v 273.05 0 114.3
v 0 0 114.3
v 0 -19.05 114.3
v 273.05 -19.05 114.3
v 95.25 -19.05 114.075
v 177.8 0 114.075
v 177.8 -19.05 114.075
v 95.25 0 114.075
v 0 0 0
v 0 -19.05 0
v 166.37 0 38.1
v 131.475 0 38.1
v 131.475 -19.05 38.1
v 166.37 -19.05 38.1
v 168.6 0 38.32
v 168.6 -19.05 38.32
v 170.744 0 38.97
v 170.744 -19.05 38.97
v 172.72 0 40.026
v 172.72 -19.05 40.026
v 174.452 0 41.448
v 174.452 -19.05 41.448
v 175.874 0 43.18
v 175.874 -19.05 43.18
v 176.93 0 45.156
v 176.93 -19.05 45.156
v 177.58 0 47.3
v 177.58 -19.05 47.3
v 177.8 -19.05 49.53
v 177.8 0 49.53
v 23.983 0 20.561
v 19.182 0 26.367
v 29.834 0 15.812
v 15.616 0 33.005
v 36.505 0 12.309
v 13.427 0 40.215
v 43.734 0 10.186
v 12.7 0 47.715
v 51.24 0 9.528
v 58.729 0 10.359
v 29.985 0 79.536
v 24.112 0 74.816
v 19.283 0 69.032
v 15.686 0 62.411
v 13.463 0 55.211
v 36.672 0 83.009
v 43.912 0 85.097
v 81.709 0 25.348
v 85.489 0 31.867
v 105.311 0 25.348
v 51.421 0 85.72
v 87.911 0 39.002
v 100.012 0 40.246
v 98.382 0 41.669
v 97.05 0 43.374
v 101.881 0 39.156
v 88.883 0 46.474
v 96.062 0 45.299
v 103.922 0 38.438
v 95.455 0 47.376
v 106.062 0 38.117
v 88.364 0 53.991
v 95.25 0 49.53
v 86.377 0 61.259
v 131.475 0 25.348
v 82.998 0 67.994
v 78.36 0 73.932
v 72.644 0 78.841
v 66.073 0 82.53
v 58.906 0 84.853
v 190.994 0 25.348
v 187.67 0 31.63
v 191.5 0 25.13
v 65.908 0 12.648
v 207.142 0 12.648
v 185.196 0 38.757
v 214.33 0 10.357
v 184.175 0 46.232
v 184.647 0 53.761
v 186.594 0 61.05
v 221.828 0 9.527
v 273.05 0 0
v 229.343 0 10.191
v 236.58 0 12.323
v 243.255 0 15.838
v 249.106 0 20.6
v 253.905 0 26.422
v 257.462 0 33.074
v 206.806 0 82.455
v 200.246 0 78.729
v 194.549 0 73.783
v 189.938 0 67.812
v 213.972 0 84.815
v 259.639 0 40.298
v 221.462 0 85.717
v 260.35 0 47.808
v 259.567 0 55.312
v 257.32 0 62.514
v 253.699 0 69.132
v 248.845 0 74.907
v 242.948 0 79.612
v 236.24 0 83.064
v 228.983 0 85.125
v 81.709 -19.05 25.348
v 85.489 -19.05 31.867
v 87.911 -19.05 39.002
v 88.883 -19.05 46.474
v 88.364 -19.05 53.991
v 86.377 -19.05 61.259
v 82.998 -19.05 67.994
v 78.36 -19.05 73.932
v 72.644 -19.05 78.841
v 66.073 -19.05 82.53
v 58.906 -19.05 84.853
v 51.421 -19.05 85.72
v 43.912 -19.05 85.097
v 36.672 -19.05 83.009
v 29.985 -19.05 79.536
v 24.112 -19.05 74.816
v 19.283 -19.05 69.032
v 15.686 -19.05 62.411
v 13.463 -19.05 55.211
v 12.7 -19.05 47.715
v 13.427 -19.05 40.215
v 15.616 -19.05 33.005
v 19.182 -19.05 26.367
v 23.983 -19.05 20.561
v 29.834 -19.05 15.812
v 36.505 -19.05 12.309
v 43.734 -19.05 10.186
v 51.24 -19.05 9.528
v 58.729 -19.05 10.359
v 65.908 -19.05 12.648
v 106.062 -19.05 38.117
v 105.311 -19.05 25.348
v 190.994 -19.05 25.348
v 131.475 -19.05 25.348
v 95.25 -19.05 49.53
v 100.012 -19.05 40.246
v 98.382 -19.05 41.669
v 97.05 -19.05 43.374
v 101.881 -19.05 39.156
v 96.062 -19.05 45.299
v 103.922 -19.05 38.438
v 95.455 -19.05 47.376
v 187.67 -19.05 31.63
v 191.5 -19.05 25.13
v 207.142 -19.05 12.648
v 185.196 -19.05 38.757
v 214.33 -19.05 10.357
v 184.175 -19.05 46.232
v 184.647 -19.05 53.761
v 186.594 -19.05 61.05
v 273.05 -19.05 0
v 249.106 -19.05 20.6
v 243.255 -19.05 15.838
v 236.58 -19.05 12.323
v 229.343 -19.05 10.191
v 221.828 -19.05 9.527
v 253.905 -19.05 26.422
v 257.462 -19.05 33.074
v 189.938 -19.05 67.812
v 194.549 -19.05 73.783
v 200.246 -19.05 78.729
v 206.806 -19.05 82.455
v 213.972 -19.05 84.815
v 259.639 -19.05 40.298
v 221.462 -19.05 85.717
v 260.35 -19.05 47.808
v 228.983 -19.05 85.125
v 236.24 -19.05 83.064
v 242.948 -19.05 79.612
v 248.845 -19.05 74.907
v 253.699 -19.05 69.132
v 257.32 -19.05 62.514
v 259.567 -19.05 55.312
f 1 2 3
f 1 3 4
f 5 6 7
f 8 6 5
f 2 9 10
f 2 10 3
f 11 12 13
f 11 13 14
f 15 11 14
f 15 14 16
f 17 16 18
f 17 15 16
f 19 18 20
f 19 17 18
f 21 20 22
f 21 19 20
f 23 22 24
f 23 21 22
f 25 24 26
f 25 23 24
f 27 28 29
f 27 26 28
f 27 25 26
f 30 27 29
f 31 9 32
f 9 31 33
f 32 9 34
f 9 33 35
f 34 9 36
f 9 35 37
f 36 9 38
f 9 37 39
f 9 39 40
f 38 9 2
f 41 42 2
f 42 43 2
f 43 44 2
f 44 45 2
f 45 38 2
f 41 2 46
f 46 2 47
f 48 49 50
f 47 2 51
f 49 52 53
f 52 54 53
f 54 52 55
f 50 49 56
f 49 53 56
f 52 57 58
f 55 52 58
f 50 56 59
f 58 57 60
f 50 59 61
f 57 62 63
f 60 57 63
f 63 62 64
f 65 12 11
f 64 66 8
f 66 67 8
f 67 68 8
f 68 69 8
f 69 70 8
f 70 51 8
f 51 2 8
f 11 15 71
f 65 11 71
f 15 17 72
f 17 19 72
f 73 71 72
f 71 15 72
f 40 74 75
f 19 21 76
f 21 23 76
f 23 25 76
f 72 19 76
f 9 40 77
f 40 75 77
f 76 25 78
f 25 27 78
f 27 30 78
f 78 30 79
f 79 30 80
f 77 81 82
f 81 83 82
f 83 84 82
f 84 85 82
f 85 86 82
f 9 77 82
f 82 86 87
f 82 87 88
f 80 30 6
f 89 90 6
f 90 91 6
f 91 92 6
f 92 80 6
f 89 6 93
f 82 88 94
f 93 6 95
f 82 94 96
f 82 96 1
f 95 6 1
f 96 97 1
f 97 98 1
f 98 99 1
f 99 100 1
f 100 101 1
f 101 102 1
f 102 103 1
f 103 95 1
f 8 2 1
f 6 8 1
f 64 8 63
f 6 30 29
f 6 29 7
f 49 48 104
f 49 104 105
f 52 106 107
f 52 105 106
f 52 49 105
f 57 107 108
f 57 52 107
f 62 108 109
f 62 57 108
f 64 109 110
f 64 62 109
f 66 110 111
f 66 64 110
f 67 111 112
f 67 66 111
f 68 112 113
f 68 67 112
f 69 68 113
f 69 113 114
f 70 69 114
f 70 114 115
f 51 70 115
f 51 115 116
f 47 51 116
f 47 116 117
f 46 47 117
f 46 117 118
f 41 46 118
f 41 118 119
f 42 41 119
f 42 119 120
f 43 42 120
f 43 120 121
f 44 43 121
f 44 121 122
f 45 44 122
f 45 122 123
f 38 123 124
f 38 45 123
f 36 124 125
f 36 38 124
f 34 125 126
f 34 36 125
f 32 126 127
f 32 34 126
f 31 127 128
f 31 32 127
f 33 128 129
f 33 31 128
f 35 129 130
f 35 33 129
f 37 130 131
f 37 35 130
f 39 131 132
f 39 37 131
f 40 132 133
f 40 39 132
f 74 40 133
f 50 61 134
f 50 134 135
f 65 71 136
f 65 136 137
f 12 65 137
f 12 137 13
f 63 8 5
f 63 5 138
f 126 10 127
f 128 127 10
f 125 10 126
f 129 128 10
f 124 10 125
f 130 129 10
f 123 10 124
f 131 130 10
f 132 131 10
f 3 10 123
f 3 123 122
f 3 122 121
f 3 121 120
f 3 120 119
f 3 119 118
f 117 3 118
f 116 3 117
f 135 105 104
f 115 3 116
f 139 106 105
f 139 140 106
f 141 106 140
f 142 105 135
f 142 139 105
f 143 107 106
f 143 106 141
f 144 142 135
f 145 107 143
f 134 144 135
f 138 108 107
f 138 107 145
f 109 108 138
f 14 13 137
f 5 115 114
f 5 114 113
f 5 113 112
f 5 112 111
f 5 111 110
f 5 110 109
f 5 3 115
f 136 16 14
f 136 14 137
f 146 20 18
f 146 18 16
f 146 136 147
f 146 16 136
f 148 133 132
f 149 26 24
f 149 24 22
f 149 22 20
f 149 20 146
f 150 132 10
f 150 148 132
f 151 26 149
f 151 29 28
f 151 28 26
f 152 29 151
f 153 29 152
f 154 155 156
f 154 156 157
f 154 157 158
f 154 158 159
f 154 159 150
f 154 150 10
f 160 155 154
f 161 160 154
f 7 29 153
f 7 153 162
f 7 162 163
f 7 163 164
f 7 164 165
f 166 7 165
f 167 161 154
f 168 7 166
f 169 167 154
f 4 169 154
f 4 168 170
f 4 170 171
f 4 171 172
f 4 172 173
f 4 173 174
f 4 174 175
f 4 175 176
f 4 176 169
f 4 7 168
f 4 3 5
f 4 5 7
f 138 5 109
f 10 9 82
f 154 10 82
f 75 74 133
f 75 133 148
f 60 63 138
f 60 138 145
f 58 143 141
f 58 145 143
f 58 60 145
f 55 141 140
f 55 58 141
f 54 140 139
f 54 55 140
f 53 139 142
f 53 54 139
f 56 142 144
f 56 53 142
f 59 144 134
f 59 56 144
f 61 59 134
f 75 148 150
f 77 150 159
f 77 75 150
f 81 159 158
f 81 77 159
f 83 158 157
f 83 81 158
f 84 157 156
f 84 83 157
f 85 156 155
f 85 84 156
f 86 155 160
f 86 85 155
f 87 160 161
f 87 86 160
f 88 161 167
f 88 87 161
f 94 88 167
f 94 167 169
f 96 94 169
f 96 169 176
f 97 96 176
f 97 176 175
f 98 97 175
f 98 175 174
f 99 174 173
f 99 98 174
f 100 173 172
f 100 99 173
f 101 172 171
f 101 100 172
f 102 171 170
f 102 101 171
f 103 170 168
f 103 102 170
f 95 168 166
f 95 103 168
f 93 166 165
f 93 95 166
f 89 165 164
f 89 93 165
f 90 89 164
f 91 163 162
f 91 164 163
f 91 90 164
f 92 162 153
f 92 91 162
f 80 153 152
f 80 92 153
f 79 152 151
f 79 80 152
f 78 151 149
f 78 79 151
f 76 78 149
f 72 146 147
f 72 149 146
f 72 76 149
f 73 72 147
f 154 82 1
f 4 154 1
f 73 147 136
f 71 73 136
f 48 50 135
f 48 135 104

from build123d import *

# Parameters (mm, degrees)
F0_W     = 273.05
F0_H     = 114.3
F1_DEPTH = 19.05
F2_R     = 38.1
F3_DEPTH = 25.4
F5_DEPTH = 25.4
F6_DEPTH = 25.4
F8_DEPTH = 25.4


with BuildPart() as f1:
    # F0 (on Front) → F1 (new body)
    with BuildSketch(Plane.XZ):
        with Locations((136.525, 57.15)):
            Rectangle(F0_W, F0_H)
    extrude(amount=F1_DEPTH)

    # F2 (on Front) → F3 (cut)
    with BuildSketch(Plane.XZ):
        with Locations((50.8, 47.625)):
            Circle(F2_R)
        with Locations((222.25, 47.625)):
            Circle(F2_R)
    extrude(amount=F3_DEPTH, mode=Mode.SUBTRACT)

    # F4 (on Front) → F5 (cut)
    with BuildSketch(Plane.XZ):
        with BuildLine():
            Line((177.8, 114.074679), (95.25, 114.074679))
            Line((95.25, 114.074679), (95.25, 49.53))
            ThreePointArc((95.25, 49.53), (98.597769, 41.447769), (106.68, 38.1))
            Line((106.68, 38.1), (166.37, 38.1))
            ThreePointArc((166.37, 38.1), (174.452231, 41.447769), (177.8, 49.53))
            Line((177.8, 49.53), (177.8, 114.074679))
        make_face()
    extrude(amount=-F5_DEPTH, mode=Mode.SUBTRACT)

    # F4 (on Front) → F6 (cut)
    with BuildSketch(Plane.XZ):
        with BuildLine():
            Line((177.8, 114.074679), (95.25, 114.074679))
            Line((95.25, 114.074679), (95.25, 49.53))
            ThreePointArc((95.25, 49.53), (98.597769, 41.447769), (106.68, 38.1))
            Line((106.68, 38.1), (166.37, 38.1))
            ThreePointArc((166.37, 38.1), (174.452231, 41.447769), (177.8, 49.53))
            Line((177.8, 49.53), (177.8, 114.074679))
        make_face()
    extrude(amount=F6_DEPTH, mode=Mode.SUBTRACT)

    # F7 (on Front) → F8 (cut)
    with BuildSketch(Plane.XZ):
        Polygon((131.474693, 38.327217), (106.074693, 38.327217), (105.311239, 25.348496), (79.911239, 25.348496), (50.899979, 12.648496), (220.386818, 12.648496), (190.993831, 25.348496), (131.474693, 25.348496), align=None)
    extrude(amount=F8_DEPTH, mode=Mode.SUBTRACT)


solid = f1.part
